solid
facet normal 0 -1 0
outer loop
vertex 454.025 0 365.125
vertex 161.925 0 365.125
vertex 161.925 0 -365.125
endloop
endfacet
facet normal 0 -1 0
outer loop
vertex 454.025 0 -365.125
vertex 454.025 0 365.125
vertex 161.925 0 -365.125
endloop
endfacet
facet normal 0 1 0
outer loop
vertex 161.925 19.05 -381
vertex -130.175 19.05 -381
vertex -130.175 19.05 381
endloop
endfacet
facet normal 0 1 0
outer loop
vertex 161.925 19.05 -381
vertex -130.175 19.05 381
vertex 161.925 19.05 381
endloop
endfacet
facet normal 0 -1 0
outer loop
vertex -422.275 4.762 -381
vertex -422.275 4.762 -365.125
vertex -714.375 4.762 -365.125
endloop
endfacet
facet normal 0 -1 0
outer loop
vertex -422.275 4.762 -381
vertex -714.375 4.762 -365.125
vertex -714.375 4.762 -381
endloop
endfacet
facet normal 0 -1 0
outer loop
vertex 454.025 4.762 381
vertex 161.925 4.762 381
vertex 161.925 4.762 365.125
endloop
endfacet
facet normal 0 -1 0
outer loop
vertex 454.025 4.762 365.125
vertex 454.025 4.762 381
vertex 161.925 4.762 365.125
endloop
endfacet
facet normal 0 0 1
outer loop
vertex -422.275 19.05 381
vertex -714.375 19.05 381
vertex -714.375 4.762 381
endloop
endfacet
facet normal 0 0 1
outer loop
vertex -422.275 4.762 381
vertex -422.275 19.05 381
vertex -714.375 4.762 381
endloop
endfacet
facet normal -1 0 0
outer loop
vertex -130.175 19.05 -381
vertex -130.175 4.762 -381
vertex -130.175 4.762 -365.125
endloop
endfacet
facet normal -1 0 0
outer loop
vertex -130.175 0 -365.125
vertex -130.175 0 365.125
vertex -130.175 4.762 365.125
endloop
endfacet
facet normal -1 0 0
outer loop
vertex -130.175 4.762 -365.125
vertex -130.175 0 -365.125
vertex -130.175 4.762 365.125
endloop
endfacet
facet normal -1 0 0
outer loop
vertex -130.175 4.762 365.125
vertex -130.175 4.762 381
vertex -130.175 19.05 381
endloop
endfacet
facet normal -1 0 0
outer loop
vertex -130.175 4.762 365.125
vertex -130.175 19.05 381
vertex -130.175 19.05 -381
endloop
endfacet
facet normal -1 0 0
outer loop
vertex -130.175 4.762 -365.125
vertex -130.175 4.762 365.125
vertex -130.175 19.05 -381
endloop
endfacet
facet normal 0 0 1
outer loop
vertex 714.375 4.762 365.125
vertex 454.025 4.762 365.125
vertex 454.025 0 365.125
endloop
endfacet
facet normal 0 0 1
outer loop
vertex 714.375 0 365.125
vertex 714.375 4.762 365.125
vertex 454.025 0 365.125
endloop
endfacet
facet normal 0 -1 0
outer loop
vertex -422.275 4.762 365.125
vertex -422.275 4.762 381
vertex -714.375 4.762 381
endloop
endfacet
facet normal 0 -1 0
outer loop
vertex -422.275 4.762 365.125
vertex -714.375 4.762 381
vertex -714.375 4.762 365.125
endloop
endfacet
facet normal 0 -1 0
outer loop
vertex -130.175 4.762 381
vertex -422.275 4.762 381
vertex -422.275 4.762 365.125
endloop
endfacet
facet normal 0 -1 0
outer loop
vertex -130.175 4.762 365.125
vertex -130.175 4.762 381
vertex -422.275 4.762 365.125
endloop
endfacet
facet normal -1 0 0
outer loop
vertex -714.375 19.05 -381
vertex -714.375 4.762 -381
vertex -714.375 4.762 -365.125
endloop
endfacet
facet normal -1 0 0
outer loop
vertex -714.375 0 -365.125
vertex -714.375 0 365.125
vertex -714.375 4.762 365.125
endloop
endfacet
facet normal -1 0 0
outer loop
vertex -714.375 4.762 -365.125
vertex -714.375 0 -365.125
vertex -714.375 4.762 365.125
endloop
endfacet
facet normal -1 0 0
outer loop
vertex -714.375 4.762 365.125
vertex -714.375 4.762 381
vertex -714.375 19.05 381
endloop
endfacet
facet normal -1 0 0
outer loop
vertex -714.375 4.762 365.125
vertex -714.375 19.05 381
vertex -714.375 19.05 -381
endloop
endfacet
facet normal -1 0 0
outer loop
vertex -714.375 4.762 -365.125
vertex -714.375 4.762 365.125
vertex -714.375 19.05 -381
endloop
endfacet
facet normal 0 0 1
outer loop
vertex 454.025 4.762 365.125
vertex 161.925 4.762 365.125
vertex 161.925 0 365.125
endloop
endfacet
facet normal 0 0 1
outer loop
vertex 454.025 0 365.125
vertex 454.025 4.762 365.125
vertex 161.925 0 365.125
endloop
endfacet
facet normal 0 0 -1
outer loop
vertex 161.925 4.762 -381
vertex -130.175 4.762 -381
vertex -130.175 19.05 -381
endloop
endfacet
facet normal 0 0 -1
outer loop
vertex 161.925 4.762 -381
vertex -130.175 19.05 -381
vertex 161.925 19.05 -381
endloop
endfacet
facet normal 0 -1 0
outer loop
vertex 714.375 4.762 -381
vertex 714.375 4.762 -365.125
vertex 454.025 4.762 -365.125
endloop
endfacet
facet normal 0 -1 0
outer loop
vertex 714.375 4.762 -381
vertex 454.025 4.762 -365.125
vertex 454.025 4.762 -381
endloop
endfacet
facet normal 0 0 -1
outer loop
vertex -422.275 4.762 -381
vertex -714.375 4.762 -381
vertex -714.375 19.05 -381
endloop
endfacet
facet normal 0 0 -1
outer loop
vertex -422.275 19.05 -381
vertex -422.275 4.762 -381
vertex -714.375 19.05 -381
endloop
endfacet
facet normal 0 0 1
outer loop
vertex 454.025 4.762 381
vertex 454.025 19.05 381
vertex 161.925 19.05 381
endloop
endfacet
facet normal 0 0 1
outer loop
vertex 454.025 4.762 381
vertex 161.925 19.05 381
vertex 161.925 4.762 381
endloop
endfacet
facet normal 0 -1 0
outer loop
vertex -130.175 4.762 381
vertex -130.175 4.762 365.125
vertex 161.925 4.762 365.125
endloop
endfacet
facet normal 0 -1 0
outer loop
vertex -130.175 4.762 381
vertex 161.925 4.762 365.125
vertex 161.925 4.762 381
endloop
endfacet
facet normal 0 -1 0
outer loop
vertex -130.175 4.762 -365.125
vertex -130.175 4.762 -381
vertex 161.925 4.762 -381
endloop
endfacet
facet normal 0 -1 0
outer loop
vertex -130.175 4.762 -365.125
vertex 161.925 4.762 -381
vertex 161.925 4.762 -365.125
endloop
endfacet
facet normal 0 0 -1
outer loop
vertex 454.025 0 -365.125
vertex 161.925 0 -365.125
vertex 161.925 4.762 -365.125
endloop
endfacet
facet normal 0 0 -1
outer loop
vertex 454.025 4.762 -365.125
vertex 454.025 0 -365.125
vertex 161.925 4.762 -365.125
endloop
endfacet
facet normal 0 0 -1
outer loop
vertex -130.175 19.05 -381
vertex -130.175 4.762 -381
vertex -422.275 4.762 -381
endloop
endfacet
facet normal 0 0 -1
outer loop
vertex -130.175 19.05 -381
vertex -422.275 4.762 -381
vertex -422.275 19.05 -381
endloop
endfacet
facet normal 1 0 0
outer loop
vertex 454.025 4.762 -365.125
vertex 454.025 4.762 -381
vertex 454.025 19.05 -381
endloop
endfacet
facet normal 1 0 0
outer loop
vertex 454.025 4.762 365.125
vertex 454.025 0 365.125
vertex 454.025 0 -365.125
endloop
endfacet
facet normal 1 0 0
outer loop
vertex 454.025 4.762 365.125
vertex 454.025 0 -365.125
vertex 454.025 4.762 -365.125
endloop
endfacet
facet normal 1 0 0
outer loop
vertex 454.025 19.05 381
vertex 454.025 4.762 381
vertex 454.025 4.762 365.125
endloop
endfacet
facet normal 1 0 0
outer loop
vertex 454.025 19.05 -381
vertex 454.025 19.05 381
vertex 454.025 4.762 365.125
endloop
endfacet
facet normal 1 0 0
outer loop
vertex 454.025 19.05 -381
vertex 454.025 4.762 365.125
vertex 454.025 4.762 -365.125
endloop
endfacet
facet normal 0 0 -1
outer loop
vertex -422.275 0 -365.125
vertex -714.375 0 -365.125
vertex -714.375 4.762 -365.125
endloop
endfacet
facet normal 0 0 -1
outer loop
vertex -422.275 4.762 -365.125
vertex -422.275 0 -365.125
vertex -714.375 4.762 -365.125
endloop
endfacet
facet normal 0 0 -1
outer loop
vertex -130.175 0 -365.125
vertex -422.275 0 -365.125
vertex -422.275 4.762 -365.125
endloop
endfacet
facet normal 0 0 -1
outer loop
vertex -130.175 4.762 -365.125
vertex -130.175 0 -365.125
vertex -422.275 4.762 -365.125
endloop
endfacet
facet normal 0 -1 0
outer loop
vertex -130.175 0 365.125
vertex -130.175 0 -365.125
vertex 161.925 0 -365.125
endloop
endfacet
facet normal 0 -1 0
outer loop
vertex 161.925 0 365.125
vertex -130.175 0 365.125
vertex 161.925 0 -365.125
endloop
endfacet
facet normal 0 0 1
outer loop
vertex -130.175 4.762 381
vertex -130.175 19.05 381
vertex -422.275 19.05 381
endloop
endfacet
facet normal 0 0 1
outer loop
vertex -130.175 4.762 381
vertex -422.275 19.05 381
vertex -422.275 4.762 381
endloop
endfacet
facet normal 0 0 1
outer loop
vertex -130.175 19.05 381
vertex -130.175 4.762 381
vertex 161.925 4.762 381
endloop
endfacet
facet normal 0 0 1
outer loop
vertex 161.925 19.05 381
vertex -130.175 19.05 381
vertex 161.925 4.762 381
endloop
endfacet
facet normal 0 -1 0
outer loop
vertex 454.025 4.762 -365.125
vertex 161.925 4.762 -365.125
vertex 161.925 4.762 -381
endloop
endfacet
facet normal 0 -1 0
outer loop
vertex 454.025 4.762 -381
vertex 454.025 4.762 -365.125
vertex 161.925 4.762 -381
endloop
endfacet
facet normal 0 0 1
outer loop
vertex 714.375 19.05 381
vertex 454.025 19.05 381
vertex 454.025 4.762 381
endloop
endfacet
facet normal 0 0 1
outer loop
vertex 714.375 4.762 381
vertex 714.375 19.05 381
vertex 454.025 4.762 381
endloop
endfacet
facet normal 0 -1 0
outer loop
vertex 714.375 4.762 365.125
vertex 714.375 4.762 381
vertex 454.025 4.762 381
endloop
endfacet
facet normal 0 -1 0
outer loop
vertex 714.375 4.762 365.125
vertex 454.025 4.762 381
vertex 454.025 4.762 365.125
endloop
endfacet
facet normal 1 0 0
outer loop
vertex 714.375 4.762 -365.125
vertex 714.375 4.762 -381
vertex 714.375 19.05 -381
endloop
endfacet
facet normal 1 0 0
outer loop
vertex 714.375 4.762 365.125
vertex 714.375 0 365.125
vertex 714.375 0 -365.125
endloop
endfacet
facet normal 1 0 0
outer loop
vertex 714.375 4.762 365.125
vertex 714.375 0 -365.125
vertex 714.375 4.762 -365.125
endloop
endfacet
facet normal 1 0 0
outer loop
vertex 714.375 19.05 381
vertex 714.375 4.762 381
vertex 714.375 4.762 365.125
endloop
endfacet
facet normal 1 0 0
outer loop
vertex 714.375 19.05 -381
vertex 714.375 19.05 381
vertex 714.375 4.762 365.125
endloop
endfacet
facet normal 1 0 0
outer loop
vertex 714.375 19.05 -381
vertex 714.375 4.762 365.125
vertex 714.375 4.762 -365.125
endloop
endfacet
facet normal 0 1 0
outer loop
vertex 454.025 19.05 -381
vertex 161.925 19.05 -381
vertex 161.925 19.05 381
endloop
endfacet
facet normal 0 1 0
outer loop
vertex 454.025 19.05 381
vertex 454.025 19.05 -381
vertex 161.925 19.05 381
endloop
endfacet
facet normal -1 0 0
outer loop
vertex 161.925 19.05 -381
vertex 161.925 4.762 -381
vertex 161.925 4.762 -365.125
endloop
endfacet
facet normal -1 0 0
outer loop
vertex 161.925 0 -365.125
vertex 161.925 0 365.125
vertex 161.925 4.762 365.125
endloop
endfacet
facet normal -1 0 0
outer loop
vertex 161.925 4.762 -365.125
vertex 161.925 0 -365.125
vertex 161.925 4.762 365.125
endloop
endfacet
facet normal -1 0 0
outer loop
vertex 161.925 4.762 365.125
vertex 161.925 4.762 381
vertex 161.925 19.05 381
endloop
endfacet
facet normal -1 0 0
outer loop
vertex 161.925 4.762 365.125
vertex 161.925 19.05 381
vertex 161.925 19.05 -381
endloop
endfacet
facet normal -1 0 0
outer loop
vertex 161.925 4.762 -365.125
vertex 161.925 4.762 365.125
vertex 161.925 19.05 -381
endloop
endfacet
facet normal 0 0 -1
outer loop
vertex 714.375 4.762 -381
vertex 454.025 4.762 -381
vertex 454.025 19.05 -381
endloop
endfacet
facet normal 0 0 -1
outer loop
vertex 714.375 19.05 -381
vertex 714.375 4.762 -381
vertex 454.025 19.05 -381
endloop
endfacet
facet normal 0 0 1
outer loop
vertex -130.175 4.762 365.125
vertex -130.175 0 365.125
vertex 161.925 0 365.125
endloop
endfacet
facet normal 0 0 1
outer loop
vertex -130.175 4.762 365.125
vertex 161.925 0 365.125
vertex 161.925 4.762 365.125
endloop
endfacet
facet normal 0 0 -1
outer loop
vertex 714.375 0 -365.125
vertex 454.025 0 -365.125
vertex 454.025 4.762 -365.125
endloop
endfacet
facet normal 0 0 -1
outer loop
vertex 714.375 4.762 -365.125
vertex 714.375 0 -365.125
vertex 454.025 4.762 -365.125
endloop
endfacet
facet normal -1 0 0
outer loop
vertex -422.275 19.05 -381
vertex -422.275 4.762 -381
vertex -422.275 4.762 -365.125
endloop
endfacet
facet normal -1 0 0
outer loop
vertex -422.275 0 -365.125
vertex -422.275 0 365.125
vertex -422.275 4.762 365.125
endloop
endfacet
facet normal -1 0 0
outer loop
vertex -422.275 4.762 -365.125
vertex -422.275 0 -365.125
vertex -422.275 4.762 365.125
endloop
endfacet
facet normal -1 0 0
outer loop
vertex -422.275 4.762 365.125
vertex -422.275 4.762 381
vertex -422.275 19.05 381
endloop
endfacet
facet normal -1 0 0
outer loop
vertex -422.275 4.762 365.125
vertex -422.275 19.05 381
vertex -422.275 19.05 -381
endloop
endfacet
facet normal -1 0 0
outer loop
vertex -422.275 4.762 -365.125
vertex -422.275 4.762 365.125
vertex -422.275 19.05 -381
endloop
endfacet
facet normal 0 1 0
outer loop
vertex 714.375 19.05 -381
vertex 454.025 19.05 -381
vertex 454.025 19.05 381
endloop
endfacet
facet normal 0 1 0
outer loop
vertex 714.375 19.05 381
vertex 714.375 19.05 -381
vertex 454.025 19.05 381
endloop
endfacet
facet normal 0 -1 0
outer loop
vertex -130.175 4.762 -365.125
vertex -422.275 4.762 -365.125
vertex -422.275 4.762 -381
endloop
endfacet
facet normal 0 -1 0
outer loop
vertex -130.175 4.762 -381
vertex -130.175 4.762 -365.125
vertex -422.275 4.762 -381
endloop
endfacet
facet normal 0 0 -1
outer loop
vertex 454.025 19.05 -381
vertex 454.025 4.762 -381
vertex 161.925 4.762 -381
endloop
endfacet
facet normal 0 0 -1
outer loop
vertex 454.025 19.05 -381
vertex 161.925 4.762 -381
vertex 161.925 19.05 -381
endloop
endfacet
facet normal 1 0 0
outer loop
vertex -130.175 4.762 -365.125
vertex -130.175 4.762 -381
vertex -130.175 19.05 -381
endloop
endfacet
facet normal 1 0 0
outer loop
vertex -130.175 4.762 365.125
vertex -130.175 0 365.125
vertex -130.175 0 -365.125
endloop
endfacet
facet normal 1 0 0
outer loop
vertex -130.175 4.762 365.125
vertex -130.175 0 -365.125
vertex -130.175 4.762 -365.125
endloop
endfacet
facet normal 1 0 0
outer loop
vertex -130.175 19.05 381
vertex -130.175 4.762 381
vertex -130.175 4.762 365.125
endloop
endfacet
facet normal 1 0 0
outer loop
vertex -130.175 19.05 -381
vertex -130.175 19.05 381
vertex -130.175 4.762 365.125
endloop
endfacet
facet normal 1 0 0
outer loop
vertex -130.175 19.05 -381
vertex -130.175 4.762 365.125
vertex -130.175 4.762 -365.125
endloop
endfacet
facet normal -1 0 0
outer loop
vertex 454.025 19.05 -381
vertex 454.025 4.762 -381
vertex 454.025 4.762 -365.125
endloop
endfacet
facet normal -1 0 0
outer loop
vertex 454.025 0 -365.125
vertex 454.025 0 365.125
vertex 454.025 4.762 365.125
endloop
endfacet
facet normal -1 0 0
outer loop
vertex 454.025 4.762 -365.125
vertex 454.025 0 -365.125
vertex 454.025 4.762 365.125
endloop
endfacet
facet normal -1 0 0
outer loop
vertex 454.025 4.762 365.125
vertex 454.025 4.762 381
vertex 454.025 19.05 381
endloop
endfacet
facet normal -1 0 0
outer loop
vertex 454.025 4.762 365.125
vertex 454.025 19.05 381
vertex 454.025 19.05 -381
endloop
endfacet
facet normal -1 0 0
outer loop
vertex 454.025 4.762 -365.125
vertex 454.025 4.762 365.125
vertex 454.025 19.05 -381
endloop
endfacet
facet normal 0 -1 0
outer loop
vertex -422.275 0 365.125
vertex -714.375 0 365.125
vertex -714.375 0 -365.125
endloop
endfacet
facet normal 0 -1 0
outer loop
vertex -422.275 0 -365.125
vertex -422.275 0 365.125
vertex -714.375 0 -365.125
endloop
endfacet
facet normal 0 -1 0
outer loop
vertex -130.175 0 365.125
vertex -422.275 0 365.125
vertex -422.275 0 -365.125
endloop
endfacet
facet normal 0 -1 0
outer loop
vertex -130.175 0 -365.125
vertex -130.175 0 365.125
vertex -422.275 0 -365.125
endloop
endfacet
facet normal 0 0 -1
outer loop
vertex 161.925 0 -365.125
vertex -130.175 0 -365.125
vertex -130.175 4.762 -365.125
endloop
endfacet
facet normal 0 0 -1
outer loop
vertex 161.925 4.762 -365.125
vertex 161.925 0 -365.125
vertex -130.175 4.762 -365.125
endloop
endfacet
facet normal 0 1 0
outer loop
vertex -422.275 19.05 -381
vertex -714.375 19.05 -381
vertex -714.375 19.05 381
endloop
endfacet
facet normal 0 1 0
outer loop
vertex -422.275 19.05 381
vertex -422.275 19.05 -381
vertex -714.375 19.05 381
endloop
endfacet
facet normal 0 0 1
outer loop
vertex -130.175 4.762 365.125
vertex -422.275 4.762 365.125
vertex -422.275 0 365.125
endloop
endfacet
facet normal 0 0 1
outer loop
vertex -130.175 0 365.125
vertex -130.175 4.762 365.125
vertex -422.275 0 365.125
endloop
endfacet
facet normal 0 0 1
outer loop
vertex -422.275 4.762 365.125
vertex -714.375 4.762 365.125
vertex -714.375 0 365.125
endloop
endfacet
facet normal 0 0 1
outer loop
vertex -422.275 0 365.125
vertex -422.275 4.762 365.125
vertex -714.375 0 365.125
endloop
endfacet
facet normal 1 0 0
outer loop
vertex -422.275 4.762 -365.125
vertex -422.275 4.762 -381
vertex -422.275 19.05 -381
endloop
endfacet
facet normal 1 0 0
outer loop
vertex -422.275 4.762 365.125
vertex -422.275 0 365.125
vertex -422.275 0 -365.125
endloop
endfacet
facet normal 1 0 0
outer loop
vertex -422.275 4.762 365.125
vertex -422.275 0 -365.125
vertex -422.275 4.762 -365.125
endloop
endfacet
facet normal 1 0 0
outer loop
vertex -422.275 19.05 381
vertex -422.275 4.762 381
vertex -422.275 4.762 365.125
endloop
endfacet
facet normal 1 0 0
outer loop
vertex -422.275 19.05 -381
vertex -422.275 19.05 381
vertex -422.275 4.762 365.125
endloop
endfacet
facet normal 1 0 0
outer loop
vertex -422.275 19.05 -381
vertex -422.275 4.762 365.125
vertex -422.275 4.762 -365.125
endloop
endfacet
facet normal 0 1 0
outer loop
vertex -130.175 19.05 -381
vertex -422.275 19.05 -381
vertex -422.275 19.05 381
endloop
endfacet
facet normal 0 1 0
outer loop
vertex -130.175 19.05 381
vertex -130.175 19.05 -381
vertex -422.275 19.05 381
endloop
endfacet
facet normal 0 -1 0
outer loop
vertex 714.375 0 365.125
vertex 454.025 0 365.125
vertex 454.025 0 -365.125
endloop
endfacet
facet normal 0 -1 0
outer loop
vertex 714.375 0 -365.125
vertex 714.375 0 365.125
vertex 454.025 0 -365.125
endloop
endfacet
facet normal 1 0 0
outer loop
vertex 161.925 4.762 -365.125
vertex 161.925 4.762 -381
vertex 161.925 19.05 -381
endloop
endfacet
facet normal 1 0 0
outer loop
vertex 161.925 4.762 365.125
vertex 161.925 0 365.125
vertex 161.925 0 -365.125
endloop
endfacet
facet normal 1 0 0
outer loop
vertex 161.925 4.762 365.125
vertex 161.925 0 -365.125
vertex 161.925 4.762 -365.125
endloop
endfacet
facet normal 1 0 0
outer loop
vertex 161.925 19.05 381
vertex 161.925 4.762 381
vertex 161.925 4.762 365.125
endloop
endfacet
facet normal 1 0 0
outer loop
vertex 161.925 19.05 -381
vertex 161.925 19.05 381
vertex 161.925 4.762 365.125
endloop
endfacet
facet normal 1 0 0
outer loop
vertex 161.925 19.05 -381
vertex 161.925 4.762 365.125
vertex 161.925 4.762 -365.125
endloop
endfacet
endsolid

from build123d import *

# Parameters (mm, degrees)
SKETCH1_W           = 1428.75
SKETCH1_H           = 762
BOSS_EXTRUDE1_DEPTH = 19.05
SKETCH3_W           = 15.875
SKETCH3_H           = 4.7625
CUT_EXTRUDE1_DEPTH  = 1479.800346565
SPLIT1_START        = 454.025
SPLIT1_DEPTH        = 260.35
SPLIT1_START_2      = -714.375
SPLIT1_2_DEPTH      = 292.1
SPLIT1_START_3      = -422.275
SPLIT1_3_DEPTH      = 292.1
SPLIT1_4_DEPTH      = 584.2
SPLIT1_START_4      = 161.925
SPLIT1_5_DEPTH      = 552.45
SPLIT1_6_DEPTH      = 292.1


# Read off the part's stored shape, not the designer's step: Split1
with BuildPart() as part:
    # Sketch1 → Boss-Extrude1 (new body)
    with BuildSketch(Plane(origin=(0, 0, 0), x_dir=(1, 0, 0), z_dir=(0, 1, 0))):
        Rectangle(SKETCH1_W, SKETCH1_H)
    extrude(amount=BOSS_EXTRUDE1_DEPTH)

    # Sketch3 → Cut-Extrude1 (cut, through all)
    with BuildSketch(Plane.ZY.offset(714.375)):
        with Locations((-373.0625, 2.38125)):
            Rectangle(SKETCH3_W, SKETCH3_H)
        with Locations((373.0625, 2.38125)):
            Rectangle(SKETCH3_W, SKETCH3_H)
    extrude(amount=-CUT_EXTRUDE1_DEPTH, mode=Mode.SUBTRACT)

    # Split1 4 outline → Split1 4 (cut)
    with BuildSketch(Plane.YZ.offset(SPLIT1_START_2)):
        Polygon((4.7625, -381), (19.05, -381), (19.05, 381), (4.7625, 381), (4.7625, 365.125), (0, 365.125), (0, -365.125), (4.7625, -365.125), align=None)
    extrude(amount=SPLIT1_4_DEPTH, mode=Mode.SUBTRACT)

    # Split1 5 outline → Split1 5 (cut)
    with BuildSketch(Plane.YZ.offset(SPLIT1_START_4)):
        Polygon((4.7625, -381), (19.05, -381), (19.05, 381), (4.7625, 381), (4.7625, 365.125), (0, 365.125), (0, -365.125), (4.7625, -365.125), align=None)
    extrude(amount=SPLIT1_5_DEPTH, mode=Mode.SUBTRACT)


with BuildPart() as body_2:
    # Split1 outline → Split1 (new body)
    with BuildSketch(Plane.YZ.offset(SPLIT1_START)):
        Polygon((19.05, 381), (4.7625, 381), (4.7625, 365.125), (0, 365.125), (0, -365.125), (4.7625, -365.125), (4.7625, -381), (19.05, -381), align=None)
    extrude(amount=SPLIT1_DEPTH)


with BuildPart() as body_3:
    # Split1 2 outline → Split1 2 (new body)
    with BuildSketch(Plane.YZ.offset(SPLIT1_START_2)):
        Polygon((4.7625, -381), (19.05, -381), (19.05, 381), (4.7625, 381), (4.7625, 365.125), (0, 365.125), (0, -365.125), (4.7625, -365.125), align=None)
    extrude(amount=SPLIT1_2_DEPTH)


with BuildPart() as body_4:
    # Split1 3 outline → Split1 3 (new body)
    with BuildSketch(Plane.YZ.offset(SPLIT1_START_3)):
        Polygon((4.7625, -381), (19.05, -381), (19.05, 381), (4.7625, 381), (4.7625, 365.125), (0, 365.125), (0, -365.125), (4.7625, -365.125), align=None)
    extrude(amount=SPLIT1_3_DEPTH)


with BuildPart() as body_5:
    # Split1 6 outline → Split1 6 (new body)
    with BuildSketch(Plane.YZ.offset(SPLIT1_START_4)):
        Polygon((4.7625, -381), (19.05, -381), (19.05, 381), (4.7625, 381), (4.7625, 365.125), (0, 365.125), (0, -365.125), (4.7625, -365.125), align=None)
    extrude(amount=SPLIT1_6_DEPTH)


solid = Compound([part.part, body_2.part, body_3.part, body_4.part, body_5.part])
